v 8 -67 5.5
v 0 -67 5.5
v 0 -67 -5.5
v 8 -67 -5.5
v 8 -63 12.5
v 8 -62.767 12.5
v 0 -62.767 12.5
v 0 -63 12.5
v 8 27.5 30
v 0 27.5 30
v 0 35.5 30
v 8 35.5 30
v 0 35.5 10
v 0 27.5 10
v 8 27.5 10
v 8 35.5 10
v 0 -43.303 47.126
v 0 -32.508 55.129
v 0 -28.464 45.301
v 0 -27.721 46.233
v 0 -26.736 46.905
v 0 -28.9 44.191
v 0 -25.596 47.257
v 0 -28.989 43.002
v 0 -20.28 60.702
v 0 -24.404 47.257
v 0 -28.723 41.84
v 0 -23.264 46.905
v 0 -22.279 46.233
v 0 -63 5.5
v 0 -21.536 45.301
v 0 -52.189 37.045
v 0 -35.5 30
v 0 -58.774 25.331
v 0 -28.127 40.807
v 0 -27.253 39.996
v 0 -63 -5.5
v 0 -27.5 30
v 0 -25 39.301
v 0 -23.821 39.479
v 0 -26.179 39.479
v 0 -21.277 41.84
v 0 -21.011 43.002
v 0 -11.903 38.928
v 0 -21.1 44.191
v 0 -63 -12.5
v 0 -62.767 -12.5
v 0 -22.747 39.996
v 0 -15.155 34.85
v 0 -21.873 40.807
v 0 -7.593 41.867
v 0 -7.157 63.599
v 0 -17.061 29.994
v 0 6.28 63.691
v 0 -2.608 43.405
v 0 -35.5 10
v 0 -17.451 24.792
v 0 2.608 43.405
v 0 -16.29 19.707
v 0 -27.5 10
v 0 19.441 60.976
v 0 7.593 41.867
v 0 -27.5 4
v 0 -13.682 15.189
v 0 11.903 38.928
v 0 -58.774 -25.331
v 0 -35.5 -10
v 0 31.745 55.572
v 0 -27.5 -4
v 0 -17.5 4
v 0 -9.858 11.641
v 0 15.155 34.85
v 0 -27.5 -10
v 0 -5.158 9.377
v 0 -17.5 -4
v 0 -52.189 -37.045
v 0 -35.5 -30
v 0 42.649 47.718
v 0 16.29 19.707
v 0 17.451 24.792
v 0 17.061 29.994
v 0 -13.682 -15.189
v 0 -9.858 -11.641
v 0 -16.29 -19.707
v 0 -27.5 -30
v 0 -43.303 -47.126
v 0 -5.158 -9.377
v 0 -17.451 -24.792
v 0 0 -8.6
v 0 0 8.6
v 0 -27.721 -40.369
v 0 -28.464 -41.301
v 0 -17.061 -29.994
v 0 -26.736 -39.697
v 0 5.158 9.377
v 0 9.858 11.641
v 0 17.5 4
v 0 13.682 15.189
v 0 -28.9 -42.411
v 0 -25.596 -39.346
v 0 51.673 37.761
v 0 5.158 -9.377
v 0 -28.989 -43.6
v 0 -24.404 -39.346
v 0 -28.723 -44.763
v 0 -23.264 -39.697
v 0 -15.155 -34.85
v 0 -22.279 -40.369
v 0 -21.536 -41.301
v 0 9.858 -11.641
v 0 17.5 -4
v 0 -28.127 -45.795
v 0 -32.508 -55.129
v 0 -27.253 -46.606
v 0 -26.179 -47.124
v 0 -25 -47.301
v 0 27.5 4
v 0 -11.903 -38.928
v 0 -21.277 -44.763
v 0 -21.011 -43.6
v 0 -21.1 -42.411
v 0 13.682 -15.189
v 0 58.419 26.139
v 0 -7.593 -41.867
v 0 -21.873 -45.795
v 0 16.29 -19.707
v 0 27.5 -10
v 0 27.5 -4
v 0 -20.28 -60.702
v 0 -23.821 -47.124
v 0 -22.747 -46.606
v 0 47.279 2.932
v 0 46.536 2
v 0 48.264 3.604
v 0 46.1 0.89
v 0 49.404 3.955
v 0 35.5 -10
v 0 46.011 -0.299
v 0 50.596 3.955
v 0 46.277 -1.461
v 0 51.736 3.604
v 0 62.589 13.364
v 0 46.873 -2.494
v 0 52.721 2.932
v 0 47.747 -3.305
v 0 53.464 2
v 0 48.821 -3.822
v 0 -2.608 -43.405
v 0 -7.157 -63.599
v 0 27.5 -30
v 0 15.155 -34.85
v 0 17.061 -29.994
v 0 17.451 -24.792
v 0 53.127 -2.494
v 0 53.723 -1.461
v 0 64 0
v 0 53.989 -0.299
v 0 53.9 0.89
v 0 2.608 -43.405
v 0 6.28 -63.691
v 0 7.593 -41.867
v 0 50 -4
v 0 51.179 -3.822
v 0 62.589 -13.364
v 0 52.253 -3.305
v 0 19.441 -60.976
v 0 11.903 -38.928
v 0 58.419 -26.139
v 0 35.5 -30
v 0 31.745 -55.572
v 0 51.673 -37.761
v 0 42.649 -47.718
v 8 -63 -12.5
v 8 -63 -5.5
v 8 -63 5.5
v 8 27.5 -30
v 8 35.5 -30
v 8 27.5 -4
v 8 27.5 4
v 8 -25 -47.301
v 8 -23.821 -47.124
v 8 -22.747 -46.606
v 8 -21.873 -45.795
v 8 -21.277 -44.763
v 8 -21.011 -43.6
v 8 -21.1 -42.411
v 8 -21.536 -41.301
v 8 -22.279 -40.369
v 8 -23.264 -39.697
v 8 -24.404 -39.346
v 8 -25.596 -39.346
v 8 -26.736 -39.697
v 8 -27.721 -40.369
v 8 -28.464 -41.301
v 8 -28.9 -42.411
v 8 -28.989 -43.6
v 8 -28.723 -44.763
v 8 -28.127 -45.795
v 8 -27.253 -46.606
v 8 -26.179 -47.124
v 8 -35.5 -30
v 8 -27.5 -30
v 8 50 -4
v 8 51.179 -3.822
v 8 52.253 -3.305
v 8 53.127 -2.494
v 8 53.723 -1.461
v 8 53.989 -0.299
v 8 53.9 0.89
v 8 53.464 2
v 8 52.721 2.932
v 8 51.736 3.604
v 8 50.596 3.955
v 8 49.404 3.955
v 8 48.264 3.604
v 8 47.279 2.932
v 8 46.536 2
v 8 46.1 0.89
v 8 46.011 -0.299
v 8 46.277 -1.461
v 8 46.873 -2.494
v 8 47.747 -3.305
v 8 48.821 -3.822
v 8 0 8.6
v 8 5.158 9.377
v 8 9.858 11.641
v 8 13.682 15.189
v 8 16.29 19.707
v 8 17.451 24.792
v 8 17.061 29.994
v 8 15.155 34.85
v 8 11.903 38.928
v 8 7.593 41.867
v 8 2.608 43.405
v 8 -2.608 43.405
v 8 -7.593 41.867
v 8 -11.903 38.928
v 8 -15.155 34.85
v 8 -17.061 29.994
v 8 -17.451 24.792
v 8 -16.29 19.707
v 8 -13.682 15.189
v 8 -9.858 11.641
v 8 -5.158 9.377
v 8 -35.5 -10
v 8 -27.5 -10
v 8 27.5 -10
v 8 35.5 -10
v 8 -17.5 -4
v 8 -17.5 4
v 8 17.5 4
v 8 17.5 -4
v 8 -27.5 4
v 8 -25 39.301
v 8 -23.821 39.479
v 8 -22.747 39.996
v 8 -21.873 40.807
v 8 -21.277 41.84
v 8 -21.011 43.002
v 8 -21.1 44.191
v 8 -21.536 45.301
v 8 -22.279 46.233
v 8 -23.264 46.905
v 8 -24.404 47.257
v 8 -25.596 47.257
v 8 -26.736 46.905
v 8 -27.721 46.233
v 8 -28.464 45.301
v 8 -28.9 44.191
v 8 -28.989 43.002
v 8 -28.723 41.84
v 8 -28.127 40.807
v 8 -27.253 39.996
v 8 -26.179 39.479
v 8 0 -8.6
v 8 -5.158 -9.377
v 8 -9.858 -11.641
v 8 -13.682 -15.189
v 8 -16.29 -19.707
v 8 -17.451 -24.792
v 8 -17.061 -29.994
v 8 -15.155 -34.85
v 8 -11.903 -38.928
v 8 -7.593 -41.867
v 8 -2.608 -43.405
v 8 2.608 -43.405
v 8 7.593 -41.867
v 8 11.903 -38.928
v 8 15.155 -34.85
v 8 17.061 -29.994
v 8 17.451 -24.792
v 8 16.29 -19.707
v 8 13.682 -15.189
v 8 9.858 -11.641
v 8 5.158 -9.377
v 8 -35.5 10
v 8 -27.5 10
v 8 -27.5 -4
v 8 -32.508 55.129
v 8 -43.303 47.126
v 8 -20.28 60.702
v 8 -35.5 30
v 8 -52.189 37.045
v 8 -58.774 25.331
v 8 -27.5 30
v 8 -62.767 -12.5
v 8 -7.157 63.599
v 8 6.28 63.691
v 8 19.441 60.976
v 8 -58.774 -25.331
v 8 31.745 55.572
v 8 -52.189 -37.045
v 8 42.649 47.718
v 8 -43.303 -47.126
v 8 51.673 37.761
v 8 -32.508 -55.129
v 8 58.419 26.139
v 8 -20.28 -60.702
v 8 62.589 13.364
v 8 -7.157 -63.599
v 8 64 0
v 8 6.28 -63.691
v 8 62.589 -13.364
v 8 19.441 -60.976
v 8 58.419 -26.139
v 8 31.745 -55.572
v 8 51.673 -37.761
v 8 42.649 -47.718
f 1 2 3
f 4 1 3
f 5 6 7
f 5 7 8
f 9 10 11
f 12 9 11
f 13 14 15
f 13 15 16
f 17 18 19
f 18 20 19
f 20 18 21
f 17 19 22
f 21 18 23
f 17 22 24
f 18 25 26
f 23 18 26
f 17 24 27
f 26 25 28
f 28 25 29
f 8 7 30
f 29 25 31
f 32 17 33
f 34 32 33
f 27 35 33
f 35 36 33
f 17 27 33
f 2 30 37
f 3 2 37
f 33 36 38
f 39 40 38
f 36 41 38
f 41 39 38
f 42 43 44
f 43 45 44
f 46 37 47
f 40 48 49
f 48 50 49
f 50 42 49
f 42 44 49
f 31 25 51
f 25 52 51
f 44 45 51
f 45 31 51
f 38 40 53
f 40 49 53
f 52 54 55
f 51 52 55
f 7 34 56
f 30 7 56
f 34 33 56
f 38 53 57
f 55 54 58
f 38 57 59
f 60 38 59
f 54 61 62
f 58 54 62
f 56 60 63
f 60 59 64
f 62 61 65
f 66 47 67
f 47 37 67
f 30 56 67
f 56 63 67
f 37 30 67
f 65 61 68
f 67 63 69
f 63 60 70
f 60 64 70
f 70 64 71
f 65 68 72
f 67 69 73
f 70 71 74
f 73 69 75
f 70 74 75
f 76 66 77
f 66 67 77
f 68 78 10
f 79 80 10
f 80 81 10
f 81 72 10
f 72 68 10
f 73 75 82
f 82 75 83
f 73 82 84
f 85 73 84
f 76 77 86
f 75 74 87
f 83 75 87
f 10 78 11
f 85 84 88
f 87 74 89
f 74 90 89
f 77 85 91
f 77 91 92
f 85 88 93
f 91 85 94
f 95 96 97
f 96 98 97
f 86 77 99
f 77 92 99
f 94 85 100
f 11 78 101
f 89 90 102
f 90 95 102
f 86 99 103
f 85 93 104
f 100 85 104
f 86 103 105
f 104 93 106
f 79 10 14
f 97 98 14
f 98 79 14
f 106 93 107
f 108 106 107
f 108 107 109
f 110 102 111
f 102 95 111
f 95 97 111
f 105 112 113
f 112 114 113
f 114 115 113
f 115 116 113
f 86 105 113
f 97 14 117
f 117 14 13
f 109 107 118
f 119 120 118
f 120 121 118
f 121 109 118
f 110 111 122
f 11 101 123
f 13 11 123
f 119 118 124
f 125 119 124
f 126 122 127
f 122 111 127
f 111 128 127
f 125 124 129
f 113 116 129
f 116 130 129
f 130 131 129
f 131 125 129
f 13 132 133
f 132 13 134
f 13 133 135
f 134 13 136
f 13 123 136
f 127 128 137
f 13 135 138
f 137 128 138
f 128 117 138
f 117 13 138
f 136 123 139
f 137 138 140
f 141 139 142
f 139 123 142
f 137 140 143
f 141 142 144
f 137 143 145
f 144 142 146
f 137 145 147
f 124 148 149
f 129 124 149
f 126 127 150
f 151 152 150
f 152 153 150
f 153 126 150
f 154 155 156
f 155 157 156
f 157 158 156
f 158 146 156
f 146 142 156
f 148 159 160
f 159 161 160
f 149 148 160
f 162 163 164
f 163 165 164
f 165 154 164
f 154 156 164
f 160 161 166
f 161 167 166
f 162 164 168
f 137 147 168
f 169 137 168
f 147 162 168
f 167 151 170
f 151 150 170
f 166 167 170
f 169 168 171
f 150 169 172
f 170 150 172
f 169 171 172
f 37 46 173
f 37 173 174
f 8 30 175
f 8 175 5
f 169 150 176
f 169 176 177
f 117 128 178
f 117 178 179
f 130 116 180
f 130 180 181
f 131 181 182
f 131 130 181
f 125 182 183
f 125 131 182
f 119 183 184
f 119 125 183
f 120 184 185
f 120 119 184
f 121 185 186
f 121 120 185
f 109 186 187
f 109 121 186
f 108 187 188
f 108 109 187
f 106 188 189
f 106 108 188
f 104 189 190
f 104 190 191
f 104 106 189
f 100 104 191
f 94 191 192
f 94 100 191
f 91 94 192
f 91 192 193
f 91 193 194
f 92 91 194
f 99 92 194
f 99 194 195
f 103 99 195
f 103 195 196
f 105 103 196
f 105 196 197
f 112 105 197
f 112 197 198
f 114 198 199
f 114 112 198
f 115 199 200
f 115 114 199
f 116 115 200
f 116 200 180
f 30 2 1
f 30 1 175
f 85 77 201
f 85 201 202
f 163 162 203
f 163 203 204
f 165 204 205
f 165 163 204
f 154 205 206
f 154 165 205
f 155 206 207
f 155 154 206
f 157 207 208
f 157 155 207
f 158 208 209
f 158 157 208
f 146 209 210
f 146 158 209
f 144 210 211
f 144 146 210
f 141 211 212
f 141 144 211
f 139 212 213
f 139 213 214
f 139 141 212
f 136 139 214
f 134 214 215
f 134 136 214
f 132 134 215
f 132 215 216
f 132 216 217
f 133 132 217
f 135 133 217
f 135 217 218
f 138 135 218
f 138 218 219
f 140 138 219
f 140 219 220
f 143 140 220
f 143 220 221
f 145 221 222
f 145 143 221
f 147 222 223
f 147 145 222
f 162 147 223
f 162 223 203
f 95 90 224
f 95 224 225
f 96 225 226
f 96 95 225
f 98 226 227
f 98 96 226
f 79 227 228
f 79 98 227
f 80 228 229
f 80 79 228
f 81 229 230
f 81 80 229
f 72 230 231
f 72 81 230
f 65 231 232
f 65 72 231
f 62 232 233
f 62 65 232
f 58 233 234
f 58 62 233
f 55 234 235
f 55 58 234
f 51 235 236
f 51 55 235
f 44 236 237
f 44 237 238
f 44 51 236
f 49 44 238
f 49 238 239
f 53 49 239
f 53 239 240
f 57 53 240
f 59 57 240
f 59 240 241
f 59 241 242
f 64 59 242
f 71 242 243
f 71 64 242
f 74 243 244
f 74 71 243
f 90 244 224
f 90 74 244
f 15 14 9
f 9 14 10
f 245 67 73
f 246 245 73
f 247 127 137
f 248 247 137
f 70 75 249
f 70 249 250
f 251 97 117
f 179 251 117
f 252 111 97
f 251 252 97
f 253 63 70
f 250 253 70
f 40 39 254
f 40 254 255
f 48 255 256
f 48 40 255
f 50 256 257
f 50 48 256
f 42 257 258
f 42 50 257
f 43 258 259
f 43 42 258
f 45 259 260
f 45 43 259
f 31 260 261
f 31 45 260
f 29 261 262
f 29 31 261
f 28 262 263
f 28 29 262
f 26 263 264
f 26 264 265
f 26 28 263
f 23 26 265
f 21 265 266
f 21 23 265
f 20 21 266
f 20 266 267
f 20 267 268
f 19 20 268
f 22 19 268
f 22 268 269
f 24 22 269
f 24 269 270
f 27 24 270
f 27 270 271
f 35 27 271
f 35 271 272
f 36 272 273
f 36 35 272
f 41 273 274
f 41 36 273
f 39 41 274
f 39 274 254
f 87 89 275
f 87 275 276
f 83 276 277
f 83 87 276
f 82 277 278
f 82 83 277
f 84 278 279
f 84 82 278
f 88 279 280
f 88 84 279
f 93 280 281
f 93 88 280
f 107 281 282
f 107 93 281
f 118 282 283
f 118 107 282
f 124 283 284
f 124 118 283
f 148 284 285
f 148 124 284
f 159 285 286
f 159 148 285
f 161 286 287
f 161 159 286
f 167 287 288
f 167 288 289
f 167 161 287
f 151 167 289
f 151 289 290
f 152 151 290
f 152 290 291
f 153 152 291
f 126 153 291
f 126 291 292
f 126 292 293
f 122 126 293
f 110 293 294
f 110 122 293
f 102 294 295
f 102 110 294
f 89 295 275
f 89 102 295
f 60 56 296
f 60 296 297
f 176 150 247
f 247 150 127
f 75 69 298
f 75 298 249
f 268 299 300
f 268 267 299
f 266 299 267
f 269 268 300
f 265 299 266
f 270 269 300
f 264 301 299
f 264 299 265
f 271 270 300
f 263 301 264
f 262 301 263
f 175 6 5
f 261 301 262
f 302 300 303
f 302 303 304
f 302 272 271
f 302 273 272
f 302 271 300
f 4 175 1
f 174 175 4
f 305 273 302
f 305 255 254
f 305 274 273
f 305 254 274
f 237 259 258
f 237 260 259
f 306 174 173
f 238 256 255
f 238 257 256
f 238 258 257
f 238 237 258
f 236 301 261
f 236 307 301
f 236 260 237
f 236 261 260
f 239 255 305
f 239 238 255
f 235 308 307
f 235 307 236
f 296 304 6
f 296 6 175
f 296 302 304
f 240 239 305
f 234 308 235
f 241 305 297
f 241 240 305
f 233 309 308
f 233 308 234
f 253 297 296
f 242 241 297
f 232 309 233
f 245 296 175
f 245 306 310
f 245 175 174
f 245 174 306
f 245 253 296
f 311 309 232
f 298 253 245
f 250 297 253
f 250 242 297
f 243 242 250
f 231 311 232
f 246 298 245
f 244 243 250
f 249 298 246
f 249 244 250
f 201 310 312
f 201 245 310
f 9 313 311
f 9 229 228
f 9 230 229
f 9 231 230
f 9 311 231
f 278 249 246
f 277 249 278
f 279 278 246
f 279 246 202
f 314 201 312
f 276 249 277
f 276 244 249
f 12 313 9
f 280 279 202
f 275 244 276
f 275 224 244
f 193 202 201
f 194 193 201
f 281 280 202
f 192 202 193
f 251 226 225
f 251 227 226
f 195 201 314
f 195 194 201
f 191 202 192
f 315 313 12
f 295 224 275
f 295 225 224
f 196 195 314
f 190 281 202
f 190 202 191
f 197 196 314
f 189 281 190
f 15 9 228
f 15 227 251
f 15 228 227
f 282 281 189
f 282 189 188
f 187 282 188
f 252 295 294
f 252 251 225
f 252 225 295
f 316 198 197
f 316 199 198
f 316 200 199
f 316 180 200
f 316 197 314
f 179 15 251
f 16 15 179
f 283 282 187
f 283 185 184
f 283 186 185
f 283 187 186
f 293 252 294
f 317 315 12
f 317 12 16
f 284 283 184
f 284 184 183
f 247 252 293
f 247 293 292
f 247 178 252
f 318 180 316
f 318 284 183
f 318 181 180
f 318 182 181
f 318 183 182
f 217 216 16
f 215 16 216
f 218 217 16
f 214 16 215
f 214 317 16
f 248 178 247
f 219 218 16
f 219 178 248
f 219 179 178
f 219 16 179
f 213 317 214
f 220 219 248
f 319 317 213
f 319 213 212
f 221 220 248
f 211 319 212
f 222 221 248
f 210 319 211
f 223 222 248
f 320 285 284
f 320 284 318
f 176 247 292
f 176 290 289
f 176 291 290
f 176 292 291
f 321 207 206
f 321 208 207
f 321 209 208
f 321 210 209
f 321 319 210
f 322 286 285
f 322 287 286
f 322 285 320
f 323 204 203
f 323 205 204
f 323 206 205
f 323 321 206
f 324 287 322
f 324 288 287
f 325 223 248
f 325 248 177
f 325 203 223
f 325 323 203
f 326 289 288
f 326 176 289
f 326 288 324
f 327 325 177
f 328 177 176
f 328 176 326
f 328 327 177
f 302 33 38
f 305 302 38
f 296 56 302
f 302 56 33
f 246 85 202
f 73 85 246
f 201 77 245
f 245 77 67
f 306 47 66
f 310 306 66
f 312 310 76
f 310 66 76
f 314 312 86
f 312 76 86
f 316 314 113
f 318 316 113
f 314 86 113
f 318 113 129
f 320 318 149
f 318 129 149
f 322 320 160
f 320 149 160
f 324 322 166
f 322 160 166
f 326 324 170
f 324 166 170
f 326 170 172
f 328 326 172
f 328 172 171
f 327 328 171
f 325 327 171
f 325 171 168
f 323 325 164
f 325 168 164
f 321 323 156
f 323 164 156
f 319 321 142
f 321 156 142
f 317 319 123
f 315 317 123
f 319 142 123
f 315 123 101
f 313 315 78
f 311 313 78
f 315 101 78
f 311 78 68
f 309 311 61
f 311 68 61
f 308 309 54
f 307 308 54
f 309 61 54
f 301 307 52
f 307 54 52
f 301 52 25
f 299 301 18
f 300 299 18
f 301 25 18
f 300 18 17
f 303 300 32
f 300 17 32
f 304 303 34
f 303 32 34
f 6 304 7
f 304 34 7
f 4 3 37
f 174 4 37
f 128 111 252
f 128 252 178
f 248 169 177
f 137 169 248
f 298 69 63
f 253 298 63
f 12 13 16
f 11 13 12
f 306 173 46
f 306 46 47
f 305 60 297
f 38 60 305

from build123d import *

# Parameters (mm, degrees)
SKETCH1_R           = 4
SKETCH1_R_2         = 17.5
BOSS_EXTRUDE1_DEPTH = 8
CUT_EXTRUDE1_REACH  = 95
SKETCH2_W           = 20
SKETCH2_H           = 8
SKETCH2_W_2         = 8
SKETCH2_H_2         = 10
SKETCH2_W_3         = 7
SKETCH2_H_3         = 4


with BuildPart() as part:
    # Sketch1 → Boss-Extrude1 (new body)
    with BuildSketch(Plane(origin=(0, 0, 0), x_dir=(0, 0, -1), z_dir=(1, 0, 0))):
        with BuildLine():
            Line((-12.5, -62.767427859), (-12.5, -67))
            Line((-12.5, -67), (12.5, -67))
            Line((12.5, -67), (12.5, -62.767427859))
            ThreePointArc((12.5, -62.767427859), (0, 64), (-12.5, -62.767427859))
        make_face()
        with Locations((0, 50)):
            Circle(SKETCH1_R, mode=Mode.SUBTRACT)
        with Locations((43.301270189, -25)):
            Circle(SKETCH1_R, mode=Mode.SUBTRACT)
        with Locations((-43.301270189, -25)):
            Circle(SKETCH1_R, mode=Mode.SUBTRACT)
        with Locations((-26.1, 0)):
            Circle(SKETCH1_R_2, mode=Mode.SUBTRACT)
        with Locations(Location((26.1, 0, 0), (0, 0, 180))):
            Circle(SKETCH1_R_2, mode=Mode.SUBTRACT)
    extrude(amount=BOSS_EXTRUDE1_DEPTH)

    # Sketch2 → Cut-Extrude1 (cut, up to next)
    with BuildSketch(Plane.ZY, mode=Mode.PRIVATE) as cut_extrude1_sk1:
        with Locations((20, -31.5)):
            Rectangle(SKETCH2_W, SKETCH2_H)
    cut_extrude1_tool1 = extrude(cut_extrude1_sk1.sketch, amount=-CUT_EXTRUDE1_REACH, mode=Mode.PRIVATE) & part.part
    # Sketch2 → Cut-Extrude1 (cut, up to next)
    with BuildSketch(Plane.ZY, mode=Mode.PRIVATE) as cut_extrude1_sk2:
        with Locations((-20, -31.5)):
            Rectangle(SKETCH2_W, SKETCH2_H)
    cut_extrude1_tool2 = extrude(cut_extrude1_sk2.sketch, amount=-CUT_EXTRUDE1_REACH, mode=Mode.PRIVATE) & part.part
    # Sketch2 → Cut-Extrude1 (cut, up to next)
    with BuildSketch(Plane.ZY, mode=Mode.PRIVATE) as cut_extrude1_sk3:
        with Locations((20, 31.5)):
            Rectangle(SKETCH2_W, SKETCH2_H)
    cut_extrude1_tool3 = extrude(cut_extrude1_sk3.sketch, amount=-CUT_EXTRUDE1_REACH, mode=Mode.PRIVATE) & part.part
    # Sketch2 → Cut-Extrude1 (cut, up to next)
    with BuildSketch(Plane.ZY, mode=Mode.PRIVATE) as cut_extrude1_sk4:
        with Locations((-20, 31.5)):
            Rectangle(SKETCH2_W, SKETCH2_H)
    cut_extrude1_tool4 = extrude(cut_extrude1_sk4.sketch, amount=-CUT_EXTRUDE1_REACH, mode=Mode.PRIVATE) & part.part
    # Sketch2 → Cut-Extrude1 (cut, up to next)
    with BuildSketch(Plane.ZY, mode=Mode.PRIVATE) as cut_extrude1_sk5:
        with Locations((0, 22.5)):
            Rectangle(SKETCH2_W_2, SKETCH2_H_2)
    cut_extrude1_tool5 = extrude(cut_extrude1_sk5.sketch, amount=-CUT_EXTRUDE1_REACH, mode=Mode.PRIVATE) & part.part
    # Sketch2 → Cut-Extrude1 (cut, up to next)
    with BuildSketch(Plane.ZY, mode=Mode.PRIVATE) as cut_extrude1_sk6:
        with Locations((0, -22.5)):
            Rectangle(SKETCH2_W_2, SKETCH2_H_2)
    cut_extrude1_tool6 = extrude(cut_extrude1_sk6.sketch, amount=-CUT_EXTRUDE1_REACH, mode=Mode.PRIVATE) & part.part
    # Sketch2 → Cut-Extrude1 (cut, up to next)
    with BuildSketch(Plane.ZY, mode=Mode.PRIVATE) as cut_extrude1_sk7:
        with Locations((9, -65)):
            Rectangle(SKETCH2_W_3, SKETCH2_H_3)
    cut_extrude1_tool7 = extrude(cut_extrude1_sk7.sketch, amount=-CUT_EXTRUDE1_REACH, mode=Mode.PRIVATE) & part.part
    # Sketch2 → Cut-Extrude1 (cut, up to next)
    with BuildSketch(Plane.ZY, mode=Mode.PRIVATE) as cut_extrude1_sk8:
        with Locations((-9, -65)):
            Rectangle(SKETCH2_W_3, SKETCH2_H_3)
    cut_extrude1_tool8 = extrude(cut_extrude1_sk8.sketch, amount=-CUT_EXTRUDE1_REACH, mode=Mode.PRIVATE) & part.part
    add(cut_extrude1_tool1.solids().sort_by_distance((0, -31.5, 20))[0], mode=Mode.SUBTRACT)
    add(cut_extrude1_tool2.solids().sort_by_distance((0, -31.5, -20))[0], mode=Mode.SUBTRACT)
    add(cut_extrude1_tool3.solids().sort_by_distance((0, 31.5, 20))[0], mode=Mode.SUBTRACT)
    add(cut_extrude1_tool4.solids().sort_by_distance((0, 31.5, -20))[0], mode=Mode.SUBTRACT)
    add(cut_extrude1_tool5.solids().sort_by_distance((0, 22.5, 0))[0], mode=Mode.SUBTRACT)
    add(cut_extrude1_tool6.solids().sort_by_distance((0, -22.5, 0))[0], mode=Mode.SUBTRACT)
    add(cut_extrude1_tool7.solids().sort_by_distance((0, -65, 9))[0], mode=Mode.SUBTRACT)
    add(cut_extrude1_tool8.solids().sort_by_distance((0, -65, -9))[0], mode=Mode.SUBTRACT)


solid = part.part
